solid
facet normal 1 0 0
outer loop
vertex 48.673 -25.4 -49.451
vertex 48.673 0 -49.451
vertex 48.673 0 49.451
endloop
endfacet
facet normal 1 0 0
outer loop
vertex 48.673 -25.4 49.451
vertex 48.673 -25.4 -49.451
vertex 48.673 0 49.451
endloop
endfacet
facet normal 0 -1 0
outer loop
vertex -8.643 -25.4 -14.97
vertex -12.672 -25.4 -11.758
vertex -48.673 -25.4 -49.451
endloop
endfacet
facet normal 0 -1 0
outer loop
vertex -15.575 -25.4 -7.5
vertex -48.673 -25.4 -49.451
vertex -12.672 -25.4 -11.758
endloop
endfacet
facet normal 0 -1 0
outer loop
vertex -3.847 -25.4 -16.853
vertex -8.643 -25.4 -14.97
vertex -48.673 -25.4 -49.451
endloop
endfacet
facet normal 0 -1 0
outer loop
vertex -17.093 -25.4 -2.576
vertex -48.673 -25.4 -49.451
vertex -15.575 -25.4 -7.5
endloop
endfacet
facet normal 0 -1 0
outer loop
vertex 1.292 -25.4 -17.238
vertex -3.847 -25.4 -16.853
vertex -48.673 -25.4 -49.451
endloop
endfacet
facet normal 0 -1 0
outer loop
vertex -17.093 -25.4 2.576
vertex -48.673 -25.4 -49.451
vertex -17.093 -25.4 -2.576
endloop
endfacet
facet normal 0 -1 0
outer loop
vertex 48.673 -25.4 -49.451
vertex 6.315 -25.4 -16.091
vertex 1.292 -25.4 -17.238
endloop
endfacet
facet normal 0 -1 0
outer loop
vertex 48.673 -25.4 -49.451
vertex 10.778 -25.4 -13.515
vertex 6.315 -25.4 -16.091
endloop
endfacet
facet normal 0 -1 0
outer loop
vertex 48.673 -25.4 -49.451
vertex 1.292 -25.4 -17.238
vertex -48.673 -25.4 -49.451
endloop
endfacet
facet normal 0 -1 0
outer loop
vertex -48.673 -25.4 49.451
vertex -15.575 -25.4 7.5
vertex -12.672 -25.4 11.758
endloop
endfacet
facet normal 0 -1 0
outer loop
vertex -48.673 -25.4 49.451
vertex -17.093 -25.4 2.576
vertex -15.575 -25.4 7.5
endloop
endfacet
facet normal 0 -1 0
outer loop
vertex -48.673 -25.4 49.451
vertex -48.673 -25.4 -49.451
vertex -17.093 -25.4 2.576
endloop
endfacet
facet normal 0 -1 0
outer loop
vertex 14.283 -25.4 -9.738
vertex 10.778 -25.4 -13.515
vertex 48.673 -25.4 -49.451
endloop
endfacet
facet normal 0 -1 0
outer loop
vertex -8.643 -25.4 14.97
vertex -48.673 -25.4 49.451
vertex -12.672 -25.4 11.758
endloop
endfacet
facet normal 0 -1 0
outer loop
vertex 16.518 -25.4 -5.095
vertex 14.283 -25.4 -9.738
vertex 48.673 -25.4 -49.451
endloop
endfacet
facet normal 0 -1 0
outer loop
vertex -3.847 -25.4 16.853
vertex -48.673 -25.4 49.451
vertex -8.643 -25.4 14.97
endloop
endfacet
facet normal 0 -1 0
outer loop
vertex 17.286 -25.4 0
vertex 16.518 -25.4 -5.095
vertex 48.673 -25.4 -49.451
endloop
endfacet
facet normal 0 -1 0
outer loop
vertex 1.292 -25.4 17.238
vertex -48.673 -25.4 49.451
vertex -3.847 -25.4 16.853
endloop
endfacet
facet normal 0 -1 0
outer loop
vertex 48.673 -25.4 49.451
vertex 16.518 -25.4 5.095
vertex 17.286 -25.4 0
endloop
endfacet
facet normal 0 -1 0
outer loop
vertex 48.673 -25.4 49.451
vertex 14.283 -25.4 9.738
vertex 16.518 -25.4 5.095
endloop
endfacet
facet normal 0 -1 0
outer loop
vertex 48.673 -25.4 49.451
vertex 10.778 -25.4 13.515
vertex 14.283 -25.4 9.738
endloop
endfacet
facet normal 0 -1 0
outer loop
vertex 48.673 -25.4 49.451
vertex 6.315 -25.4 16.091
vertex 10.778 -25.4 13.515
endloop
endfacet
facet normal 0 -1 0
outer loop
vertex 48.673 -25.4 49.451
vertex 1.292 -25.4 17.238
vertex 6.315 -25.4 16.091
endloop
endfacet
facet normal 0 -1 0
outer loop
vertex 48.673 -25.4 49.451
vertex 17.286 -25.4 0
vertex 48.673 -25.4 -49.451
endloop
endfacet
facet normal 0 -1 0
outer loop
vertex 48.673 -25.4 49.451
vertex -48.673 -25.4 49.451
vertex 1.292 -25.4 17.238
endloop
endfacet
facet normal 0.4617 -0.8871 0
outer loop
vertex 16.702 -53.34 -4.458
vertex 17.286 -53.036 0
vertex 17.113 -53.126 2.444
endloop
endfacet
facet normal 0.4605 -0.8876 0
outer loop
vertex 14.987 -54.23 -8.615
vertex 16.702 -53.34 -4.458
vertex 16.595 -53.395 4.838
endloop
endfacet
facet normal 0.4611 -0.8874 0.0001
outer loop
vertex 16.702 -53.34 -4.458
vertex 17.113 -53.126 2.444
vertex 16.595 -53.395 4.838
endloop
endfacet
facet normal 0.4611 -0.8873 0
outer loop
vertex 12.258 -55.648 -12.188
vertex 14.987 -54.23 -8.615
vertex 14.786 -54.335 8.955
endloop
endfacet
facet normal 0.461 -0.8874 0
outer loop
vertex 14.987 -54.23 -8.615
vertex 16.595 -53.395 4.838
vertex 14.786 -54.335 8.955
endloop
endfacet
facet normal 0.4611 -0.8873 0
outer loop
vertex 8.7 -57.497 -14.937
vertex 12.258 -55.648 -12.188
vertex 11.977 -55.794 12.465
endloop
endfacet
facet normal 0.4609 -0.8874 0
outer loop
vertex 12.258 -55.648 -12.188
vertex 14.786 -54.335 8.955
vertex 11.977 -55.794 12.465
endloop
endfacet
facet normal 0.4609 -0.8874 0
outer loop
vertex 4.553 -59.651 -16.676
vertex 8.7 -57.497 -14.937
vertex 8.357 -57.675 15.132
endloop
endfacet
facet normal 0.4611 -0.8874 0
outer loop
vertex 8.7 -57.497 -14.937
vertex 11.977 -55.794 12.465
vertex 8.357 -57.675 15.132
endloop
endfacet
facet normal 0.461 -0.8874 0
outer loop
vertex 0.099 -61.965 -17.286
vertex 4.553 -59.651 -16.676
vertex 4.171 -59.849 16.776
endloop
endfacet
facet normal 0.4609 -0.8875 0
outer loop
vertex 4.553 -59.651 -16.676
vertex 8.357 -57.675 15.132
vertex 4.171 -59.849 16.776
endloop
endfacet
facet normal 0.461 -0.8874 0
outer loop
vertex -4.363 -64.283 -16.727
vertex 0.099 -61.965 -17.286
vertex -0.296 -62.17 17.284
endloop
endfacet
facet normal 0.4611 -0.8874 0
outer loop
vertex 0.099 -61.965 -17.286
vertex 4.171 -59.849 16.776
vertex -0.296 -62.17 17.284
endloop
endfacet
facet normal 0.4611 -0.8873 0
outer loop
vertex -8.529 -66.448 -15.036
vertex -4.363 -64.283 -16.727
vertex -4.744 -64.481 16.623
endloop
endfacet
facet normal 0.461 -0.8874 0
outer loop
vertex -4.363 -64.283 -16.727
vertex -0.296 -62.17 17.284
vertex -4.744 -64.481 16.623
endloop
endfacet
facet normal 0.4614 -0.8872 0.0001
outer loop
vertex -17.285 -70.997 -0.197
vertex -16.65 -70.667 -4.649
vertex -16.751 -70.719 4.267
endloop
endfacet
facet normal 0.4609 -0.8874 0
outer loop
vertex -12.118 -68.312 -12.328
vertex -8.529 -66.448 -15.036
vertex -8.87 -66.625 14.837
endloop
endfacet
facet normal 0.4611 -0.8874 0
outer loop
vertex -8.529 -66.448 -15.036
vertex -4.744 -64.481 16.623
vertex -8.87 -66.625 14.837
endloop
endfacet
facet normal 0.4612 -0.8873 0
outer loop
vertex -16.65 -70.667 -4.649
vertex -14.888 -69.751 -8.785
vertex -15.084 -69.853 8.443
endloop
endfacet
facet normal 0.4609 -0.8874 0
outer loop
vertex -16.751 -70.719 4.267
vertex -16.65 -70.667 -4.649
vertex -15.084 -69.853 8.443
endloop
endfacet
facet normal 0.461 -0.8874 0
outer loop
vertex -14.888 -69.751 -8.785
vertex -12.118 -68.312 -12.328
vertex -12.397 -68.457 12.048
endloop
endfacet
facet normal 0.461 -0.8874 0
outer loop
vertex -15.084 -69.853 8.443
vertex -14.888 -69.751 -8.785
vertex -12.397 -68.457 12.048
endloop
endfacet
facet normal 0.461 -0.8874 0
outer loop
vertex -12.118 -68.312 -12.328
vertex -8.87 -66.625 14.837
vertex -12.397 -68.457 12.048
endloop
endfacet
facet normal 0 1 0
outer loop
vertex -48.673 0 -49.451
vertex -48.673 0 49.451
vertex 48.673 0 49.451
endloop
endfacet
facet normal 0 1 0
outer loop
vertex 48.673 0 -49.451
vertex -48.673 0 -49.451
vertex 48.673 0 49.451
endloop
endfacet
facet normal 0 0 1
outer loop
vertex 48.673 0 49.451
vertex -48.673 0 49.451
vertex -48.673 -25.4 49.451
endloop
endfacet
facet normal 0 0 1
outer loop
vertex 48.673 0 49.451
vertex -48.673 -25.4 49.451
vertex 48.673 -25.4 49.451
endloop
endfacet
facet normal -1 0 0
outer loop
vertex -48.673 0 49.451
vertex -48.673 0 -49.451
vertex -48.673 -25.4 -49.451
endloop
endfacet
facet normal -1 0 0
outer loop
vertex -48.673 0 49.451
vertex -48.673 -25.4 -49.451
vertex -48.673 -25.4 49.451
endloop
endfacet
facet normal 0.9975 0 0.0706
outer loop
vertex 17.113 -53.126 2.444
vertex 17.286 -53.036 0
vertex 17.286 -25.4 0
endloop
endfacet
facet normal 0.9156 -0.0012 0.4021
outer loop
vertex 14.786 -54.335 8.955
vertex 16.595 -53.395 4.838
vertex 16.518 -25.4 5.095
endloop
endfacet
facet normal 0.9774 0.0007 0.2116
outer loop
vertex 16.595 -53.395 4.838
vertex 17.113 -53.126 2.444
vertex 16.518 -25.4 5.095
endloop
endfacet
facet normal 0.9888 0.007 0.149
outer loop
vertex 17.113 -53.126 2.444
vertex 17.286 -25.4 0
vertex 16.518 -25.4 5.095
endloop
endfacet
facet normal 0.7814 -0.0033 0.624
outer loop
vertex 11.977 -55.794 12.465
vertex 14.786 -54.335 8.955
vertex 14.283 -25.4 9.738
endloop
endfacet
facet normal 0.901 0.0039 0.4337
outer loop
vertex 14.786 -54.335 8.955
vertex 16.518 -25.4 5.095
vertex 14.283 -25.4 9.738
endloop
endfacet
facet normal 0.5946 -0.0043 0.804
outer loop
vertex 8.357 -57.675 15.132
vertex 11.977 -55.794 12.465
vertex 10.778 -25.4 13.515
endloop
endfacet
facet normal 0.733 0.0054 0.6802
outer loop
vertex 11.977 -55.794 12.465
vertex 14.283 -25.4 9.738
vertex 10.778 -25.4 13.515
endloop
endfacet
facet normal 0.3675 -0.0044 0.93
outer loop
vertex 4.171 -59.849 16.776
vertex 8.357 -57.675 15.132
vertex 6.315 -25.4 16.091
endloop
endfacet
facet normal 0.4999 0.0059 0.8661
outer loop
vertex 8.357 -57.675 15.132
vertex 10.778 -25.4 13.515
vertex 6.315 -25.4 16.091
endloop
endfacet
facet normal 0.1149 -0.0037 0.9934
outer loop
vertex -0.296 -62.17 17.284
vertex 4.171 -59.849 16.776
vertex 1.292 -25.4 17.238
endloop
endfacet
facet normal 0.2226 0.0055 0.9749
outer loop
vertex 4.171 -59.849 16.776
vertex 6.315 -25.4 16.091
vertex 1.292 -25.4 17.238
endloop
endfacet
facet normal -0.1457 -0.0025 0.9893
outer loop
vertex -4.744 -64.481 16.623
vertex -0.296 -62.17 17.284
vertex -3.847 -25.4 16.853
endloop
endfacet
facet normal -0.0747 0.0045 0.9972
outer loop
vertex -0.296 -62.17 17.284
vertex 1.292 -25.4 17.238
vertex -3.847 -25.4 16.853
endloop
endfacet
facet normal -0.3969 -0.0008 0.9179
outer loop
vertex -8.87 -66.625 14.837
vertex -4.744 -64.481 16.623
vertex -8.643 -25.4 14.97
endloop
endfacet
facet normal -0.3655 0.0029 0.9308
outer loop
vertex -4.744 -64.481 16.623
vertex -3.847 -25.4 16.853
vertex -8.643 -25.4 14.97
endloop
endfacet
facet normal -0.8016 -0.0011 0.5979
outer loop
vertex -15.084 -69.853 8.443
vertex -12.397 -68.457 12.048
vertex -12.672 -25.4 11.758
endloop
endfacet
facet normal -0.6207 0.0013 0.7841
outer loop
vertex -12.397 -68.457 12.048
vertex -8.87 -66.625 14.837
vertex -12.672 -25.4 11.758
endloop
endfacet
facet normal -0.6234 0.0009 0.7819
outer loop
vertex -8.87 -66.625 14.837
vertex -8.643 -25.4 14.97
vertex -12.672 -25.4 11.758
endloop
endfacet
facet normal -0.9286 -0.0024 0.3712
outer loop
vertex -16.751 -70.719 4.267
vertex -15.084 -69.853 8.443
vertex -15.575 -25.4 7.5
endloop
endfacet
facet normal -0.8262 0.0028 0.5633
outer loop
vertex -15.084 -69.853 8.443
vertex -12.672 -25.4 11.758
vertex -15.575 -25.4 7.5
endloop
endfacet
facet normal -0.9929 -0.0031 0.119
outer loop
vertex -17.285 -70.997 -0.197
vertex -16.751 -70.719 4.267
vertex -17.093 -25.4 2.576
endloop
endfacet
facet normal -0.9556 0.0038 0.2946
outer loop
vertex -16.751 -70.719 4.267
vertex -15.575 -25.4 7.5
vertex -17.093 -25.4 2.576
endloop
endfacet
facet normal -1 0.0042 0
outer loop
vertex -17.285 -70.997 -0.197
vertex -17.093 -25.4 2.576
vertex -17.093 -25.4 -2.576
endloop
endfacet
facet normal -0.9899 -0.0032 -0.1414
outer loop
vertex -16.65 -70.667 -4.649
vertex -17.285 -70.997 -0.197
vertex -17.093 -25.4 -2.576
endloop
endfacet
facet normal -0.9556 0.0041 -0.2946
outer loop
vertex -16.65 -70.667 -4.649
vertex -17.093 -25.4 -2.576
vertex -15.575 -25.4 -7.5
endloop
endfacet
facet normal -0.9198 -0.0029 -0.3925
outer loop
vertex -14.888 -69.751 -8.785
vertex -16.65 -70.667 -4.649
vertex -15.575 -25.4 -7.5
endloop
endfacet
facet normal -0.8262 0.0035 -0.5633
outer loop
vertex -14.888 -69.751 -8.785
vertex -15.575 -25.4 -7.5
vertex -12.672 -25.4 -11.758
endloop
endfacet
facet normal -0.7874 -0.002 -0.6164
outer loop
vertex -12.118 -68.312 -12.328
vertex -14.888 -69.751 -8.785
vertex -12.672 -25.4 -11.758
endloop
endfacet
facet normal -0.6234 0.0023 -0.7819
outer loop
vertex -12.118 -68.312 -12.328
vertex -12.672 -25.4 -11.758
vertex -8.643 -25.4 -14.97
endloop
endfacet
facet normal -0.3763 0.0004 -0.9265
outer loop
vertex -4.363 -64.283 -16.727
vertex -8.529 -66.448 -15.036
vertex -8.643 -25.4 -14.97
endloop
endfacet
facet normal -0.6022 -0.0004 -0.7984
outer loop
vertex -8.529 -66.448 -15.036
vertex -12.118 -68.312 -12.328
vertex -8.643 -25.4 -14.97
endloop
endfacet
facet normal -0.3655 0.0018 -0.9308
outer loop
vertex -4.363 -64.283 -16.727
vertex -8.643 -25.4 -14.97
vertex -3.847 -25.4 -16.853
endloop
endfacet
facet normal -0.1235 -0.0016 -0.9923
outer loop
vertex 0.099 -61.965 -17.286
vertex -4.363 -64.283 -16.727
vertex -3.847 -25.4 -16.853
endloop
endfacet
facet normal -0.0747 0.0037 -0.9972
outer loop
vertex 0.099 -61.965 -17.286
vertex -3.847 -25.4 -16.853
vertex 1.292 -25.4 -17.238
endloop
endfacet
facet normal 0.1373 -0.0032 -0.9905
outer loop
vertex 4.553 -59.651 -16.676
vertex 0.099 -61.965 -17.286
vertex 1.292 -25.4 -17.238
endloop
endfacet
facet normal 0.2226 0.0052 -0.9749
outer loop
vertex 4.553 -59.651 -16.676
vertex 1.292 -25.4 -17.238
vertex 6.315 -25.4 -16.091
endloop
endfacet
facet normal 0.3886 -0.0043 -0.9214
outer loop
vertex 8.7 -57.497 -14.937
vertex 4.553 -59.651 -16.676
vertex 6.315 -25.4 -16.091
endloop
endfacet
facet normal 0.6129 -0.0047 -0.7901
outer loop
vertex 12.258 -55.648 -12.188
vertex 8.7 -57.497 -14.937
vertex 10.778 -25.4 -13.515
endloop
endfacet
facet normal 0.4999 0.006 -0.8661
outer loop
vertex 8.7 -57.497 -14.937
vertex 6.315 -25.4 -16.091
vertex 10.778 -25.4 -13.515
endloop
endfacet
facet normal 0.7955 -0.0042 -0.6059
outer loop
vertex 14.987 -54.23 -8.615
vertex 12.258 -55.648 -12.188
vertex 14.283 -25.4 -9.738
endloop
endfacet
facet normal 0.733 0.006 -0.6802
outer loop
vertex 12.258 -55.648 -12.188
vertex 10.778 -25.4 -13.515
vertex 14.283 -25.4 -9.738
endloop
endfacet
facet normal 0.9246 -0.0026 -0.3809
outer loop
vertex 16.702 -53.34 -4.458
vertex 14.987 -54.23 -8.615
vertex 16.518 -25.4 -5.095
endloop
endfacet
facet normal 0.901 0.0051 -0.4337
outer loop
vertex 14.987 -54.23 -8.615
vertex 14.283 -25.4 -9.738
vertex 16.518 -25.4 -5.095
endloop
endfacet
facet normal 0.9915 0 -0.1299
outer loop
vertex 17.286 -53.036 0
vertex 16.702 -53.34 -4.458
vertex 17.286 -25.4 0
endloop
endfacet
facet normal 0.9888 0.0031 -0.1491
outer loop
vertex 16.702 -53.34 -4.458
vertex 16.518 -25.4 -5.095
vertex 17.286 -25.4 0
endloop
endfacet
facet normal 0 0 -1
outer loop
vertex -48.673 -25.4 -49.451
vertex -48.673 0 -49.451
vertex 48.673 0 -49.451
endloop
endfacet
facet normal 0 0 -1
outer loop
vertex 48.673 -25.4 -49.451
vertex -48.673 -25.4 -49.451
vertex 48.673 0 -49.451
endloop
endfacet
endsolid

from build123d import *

# Parameters (mm, degrees)
F0_W     = 97.346954
F0_H     = 98.902032
F1_DEPTH = 25.4
F2_R     = 17.286397
F3_DEPTH = 50.8
F5_DEPTH = 35.814


with BuildPart() as f1:
    # F0 (on Front) → F1 (new body)
    with BuildSketch(Plane.XZ):
        Rectangle(F0_W, F0_H)
    extrude(amount=F1_DEPTH)

    # F2 (on face) → F3 (join)
    with BuildSketch(Plane.XZ.offset(25.4)):
        Circle(F2_R)
    extrude(amount=F3_DEPTH)

    # F4 (on Top) → F5 (cut, symmetric)
    with BuildSketch(Plane.XY):
        Polygon((48.688538, -36.72133), (-35.245914, -80.327898), (48.688538, -80.327898), align=None)
    extrude(amount=F5_DEPTH, both=True, mode=Mode.SUBTRACT)


solid = f1.part
